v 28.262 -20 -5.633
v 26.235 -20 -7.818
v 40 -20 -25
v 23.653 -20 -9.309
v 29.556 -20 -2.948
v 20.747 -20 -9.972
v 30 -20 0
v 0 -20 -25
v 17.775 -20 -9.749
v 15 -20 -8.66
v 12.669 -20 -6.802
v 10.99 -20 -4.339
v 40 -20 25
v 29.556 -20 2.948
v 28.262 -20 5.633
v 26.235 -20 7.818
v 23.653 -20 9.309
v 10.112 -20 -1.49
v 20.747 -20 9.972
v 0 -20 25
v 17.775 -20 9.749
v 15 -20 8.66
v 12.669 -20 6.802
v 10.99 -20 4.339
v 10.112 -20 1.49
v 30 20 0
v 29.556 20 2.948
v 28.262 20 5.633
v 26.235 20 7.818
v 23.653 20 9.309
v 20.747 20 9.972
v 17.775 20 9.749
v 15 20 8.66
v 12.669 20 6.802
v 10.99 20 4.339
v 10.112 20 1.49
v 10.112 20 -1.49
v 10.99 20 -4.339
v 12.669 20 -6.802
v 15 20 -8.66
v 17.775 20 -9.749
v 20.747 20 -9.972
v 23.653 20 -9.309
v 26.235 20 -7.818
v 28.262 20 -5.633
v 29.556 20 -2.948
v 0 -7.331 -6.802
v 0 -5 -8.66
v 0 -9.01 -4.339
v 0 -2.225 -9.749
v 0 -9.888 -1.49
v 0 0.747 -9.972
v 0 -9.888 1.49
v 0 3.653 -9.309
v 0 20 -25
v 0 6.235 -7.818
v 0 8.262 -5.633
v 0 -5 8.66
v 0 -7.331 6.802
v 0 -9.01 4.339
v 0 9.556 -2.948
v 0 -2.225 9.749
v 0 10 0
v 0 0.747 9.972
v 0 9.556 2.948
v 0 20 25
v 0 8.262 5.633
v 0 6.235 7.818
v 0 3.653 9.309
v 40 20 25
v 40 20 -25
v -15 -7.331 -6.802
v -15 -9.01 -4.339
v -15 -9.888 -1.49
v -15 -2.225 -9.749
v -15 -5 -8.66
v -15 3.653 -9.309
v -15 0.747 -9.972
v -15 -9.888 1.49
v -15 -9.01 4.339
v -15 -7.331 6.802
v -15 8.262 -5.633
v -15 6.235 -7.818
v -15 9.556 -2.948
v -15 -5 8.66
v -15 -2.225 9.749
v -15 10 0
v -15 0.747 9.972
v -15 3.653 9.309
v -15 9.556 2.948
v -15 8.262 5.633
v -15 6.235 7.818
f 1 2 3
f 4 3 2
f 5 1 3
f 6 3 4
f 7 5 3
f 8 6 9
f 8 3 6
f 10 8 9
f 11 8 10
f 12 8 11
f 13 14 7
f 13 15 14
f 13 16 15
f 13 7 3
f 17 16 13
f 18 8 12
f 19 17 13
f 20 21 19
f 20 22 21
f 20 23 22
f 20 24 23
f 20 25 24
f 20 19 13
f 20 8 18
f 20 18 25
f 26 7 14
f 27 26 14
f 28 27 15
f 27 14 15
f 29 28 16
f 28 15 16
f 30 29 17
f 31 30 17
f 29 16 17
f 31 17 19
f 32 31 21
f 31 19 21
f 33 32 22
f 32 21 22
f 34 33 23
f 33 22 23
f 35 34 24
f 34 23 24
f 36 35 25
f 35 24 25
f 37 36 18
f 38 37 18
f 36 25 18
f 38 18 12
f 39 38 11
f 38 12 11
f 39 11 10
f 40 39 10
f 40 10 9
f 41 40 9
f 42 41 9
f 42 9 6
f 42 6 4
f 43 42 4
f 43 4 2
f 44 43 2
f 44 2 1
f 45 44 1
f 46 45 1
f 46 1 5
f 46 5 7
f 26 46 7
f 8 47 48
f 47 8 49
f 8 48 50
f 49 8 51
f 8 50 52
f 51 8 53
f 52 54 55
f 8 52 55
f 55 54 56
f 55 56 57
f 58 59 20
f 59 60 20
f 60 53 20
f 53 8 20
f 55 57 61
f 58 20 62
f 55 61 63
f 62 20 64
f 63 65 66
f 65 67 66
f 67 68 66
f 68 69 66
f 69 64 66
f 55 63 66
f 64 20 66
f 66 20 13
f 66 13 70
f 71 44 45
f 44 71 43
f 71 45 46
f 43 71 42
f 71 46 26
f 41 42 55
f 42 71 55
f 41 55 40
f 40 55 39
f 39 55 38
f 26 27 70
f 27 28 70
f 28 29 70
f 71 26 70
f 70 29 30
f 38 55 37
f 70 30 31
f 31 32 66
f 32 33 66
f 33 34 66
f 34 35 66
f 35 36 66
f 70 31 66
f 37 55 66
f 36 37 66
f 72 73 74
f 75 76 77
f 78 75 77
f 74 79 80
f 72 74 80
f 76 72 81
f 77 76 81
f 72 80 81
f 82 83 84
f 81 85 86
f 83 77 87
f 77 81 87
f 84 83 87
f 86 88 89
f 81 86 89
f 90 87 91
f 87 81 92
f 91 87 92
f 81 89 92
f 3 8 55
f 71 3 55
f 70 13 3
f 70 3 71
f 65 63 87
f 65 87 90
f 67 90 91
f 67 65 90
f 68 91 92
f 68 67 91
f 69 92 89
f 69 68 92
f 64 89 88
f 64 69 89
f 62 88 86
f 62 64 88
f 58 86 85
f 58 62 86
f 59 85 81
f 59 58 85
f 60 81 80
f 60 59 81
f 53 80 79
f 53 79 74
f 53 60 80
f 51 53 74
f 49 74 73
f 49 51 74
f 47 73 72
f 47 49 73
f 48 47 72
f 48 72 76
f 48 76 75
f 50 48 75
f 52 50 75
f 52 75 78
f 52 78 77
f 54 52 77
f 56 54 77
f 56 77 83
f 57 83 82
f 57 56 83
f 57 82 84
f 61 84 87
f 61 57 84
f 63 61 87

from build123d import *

# Parameters (mm, degrees)
F0_R     = 10
F1_DEPTH = 15
F0_W     = 40
F0_H     = 50
F2_DEPTH = 40
F3_R     = 10
F4_DEPTH = 40.001


with BuildPart() as f1:
    # F0 (on Right) → F1 (new body)
    with BuildSketch(Plane.YZ):
        Circle(F0_R)
    extrude(amount=-F1_DEPTH)

    # F0 (on Right) → F2 (join)
    with BuildSketch(Plane.YZ):
        Rectangle(F0_W, F0_H)
        Circle(F0_R, mode=Mode.SUBTRACT)
        Circle(F0_R)
    extrude(amount=F2_DEPTH)

    # F3 (on face) → F4 (cut, through all)
    with BuildSketch(Plane.XZ.offset(20)):
        with Locations((20, 0)):
            Circle(F3_R)
    extrude(amount=-F4_DEPTH, mode=Mode.SUBTRACT)


solid = f1.part
